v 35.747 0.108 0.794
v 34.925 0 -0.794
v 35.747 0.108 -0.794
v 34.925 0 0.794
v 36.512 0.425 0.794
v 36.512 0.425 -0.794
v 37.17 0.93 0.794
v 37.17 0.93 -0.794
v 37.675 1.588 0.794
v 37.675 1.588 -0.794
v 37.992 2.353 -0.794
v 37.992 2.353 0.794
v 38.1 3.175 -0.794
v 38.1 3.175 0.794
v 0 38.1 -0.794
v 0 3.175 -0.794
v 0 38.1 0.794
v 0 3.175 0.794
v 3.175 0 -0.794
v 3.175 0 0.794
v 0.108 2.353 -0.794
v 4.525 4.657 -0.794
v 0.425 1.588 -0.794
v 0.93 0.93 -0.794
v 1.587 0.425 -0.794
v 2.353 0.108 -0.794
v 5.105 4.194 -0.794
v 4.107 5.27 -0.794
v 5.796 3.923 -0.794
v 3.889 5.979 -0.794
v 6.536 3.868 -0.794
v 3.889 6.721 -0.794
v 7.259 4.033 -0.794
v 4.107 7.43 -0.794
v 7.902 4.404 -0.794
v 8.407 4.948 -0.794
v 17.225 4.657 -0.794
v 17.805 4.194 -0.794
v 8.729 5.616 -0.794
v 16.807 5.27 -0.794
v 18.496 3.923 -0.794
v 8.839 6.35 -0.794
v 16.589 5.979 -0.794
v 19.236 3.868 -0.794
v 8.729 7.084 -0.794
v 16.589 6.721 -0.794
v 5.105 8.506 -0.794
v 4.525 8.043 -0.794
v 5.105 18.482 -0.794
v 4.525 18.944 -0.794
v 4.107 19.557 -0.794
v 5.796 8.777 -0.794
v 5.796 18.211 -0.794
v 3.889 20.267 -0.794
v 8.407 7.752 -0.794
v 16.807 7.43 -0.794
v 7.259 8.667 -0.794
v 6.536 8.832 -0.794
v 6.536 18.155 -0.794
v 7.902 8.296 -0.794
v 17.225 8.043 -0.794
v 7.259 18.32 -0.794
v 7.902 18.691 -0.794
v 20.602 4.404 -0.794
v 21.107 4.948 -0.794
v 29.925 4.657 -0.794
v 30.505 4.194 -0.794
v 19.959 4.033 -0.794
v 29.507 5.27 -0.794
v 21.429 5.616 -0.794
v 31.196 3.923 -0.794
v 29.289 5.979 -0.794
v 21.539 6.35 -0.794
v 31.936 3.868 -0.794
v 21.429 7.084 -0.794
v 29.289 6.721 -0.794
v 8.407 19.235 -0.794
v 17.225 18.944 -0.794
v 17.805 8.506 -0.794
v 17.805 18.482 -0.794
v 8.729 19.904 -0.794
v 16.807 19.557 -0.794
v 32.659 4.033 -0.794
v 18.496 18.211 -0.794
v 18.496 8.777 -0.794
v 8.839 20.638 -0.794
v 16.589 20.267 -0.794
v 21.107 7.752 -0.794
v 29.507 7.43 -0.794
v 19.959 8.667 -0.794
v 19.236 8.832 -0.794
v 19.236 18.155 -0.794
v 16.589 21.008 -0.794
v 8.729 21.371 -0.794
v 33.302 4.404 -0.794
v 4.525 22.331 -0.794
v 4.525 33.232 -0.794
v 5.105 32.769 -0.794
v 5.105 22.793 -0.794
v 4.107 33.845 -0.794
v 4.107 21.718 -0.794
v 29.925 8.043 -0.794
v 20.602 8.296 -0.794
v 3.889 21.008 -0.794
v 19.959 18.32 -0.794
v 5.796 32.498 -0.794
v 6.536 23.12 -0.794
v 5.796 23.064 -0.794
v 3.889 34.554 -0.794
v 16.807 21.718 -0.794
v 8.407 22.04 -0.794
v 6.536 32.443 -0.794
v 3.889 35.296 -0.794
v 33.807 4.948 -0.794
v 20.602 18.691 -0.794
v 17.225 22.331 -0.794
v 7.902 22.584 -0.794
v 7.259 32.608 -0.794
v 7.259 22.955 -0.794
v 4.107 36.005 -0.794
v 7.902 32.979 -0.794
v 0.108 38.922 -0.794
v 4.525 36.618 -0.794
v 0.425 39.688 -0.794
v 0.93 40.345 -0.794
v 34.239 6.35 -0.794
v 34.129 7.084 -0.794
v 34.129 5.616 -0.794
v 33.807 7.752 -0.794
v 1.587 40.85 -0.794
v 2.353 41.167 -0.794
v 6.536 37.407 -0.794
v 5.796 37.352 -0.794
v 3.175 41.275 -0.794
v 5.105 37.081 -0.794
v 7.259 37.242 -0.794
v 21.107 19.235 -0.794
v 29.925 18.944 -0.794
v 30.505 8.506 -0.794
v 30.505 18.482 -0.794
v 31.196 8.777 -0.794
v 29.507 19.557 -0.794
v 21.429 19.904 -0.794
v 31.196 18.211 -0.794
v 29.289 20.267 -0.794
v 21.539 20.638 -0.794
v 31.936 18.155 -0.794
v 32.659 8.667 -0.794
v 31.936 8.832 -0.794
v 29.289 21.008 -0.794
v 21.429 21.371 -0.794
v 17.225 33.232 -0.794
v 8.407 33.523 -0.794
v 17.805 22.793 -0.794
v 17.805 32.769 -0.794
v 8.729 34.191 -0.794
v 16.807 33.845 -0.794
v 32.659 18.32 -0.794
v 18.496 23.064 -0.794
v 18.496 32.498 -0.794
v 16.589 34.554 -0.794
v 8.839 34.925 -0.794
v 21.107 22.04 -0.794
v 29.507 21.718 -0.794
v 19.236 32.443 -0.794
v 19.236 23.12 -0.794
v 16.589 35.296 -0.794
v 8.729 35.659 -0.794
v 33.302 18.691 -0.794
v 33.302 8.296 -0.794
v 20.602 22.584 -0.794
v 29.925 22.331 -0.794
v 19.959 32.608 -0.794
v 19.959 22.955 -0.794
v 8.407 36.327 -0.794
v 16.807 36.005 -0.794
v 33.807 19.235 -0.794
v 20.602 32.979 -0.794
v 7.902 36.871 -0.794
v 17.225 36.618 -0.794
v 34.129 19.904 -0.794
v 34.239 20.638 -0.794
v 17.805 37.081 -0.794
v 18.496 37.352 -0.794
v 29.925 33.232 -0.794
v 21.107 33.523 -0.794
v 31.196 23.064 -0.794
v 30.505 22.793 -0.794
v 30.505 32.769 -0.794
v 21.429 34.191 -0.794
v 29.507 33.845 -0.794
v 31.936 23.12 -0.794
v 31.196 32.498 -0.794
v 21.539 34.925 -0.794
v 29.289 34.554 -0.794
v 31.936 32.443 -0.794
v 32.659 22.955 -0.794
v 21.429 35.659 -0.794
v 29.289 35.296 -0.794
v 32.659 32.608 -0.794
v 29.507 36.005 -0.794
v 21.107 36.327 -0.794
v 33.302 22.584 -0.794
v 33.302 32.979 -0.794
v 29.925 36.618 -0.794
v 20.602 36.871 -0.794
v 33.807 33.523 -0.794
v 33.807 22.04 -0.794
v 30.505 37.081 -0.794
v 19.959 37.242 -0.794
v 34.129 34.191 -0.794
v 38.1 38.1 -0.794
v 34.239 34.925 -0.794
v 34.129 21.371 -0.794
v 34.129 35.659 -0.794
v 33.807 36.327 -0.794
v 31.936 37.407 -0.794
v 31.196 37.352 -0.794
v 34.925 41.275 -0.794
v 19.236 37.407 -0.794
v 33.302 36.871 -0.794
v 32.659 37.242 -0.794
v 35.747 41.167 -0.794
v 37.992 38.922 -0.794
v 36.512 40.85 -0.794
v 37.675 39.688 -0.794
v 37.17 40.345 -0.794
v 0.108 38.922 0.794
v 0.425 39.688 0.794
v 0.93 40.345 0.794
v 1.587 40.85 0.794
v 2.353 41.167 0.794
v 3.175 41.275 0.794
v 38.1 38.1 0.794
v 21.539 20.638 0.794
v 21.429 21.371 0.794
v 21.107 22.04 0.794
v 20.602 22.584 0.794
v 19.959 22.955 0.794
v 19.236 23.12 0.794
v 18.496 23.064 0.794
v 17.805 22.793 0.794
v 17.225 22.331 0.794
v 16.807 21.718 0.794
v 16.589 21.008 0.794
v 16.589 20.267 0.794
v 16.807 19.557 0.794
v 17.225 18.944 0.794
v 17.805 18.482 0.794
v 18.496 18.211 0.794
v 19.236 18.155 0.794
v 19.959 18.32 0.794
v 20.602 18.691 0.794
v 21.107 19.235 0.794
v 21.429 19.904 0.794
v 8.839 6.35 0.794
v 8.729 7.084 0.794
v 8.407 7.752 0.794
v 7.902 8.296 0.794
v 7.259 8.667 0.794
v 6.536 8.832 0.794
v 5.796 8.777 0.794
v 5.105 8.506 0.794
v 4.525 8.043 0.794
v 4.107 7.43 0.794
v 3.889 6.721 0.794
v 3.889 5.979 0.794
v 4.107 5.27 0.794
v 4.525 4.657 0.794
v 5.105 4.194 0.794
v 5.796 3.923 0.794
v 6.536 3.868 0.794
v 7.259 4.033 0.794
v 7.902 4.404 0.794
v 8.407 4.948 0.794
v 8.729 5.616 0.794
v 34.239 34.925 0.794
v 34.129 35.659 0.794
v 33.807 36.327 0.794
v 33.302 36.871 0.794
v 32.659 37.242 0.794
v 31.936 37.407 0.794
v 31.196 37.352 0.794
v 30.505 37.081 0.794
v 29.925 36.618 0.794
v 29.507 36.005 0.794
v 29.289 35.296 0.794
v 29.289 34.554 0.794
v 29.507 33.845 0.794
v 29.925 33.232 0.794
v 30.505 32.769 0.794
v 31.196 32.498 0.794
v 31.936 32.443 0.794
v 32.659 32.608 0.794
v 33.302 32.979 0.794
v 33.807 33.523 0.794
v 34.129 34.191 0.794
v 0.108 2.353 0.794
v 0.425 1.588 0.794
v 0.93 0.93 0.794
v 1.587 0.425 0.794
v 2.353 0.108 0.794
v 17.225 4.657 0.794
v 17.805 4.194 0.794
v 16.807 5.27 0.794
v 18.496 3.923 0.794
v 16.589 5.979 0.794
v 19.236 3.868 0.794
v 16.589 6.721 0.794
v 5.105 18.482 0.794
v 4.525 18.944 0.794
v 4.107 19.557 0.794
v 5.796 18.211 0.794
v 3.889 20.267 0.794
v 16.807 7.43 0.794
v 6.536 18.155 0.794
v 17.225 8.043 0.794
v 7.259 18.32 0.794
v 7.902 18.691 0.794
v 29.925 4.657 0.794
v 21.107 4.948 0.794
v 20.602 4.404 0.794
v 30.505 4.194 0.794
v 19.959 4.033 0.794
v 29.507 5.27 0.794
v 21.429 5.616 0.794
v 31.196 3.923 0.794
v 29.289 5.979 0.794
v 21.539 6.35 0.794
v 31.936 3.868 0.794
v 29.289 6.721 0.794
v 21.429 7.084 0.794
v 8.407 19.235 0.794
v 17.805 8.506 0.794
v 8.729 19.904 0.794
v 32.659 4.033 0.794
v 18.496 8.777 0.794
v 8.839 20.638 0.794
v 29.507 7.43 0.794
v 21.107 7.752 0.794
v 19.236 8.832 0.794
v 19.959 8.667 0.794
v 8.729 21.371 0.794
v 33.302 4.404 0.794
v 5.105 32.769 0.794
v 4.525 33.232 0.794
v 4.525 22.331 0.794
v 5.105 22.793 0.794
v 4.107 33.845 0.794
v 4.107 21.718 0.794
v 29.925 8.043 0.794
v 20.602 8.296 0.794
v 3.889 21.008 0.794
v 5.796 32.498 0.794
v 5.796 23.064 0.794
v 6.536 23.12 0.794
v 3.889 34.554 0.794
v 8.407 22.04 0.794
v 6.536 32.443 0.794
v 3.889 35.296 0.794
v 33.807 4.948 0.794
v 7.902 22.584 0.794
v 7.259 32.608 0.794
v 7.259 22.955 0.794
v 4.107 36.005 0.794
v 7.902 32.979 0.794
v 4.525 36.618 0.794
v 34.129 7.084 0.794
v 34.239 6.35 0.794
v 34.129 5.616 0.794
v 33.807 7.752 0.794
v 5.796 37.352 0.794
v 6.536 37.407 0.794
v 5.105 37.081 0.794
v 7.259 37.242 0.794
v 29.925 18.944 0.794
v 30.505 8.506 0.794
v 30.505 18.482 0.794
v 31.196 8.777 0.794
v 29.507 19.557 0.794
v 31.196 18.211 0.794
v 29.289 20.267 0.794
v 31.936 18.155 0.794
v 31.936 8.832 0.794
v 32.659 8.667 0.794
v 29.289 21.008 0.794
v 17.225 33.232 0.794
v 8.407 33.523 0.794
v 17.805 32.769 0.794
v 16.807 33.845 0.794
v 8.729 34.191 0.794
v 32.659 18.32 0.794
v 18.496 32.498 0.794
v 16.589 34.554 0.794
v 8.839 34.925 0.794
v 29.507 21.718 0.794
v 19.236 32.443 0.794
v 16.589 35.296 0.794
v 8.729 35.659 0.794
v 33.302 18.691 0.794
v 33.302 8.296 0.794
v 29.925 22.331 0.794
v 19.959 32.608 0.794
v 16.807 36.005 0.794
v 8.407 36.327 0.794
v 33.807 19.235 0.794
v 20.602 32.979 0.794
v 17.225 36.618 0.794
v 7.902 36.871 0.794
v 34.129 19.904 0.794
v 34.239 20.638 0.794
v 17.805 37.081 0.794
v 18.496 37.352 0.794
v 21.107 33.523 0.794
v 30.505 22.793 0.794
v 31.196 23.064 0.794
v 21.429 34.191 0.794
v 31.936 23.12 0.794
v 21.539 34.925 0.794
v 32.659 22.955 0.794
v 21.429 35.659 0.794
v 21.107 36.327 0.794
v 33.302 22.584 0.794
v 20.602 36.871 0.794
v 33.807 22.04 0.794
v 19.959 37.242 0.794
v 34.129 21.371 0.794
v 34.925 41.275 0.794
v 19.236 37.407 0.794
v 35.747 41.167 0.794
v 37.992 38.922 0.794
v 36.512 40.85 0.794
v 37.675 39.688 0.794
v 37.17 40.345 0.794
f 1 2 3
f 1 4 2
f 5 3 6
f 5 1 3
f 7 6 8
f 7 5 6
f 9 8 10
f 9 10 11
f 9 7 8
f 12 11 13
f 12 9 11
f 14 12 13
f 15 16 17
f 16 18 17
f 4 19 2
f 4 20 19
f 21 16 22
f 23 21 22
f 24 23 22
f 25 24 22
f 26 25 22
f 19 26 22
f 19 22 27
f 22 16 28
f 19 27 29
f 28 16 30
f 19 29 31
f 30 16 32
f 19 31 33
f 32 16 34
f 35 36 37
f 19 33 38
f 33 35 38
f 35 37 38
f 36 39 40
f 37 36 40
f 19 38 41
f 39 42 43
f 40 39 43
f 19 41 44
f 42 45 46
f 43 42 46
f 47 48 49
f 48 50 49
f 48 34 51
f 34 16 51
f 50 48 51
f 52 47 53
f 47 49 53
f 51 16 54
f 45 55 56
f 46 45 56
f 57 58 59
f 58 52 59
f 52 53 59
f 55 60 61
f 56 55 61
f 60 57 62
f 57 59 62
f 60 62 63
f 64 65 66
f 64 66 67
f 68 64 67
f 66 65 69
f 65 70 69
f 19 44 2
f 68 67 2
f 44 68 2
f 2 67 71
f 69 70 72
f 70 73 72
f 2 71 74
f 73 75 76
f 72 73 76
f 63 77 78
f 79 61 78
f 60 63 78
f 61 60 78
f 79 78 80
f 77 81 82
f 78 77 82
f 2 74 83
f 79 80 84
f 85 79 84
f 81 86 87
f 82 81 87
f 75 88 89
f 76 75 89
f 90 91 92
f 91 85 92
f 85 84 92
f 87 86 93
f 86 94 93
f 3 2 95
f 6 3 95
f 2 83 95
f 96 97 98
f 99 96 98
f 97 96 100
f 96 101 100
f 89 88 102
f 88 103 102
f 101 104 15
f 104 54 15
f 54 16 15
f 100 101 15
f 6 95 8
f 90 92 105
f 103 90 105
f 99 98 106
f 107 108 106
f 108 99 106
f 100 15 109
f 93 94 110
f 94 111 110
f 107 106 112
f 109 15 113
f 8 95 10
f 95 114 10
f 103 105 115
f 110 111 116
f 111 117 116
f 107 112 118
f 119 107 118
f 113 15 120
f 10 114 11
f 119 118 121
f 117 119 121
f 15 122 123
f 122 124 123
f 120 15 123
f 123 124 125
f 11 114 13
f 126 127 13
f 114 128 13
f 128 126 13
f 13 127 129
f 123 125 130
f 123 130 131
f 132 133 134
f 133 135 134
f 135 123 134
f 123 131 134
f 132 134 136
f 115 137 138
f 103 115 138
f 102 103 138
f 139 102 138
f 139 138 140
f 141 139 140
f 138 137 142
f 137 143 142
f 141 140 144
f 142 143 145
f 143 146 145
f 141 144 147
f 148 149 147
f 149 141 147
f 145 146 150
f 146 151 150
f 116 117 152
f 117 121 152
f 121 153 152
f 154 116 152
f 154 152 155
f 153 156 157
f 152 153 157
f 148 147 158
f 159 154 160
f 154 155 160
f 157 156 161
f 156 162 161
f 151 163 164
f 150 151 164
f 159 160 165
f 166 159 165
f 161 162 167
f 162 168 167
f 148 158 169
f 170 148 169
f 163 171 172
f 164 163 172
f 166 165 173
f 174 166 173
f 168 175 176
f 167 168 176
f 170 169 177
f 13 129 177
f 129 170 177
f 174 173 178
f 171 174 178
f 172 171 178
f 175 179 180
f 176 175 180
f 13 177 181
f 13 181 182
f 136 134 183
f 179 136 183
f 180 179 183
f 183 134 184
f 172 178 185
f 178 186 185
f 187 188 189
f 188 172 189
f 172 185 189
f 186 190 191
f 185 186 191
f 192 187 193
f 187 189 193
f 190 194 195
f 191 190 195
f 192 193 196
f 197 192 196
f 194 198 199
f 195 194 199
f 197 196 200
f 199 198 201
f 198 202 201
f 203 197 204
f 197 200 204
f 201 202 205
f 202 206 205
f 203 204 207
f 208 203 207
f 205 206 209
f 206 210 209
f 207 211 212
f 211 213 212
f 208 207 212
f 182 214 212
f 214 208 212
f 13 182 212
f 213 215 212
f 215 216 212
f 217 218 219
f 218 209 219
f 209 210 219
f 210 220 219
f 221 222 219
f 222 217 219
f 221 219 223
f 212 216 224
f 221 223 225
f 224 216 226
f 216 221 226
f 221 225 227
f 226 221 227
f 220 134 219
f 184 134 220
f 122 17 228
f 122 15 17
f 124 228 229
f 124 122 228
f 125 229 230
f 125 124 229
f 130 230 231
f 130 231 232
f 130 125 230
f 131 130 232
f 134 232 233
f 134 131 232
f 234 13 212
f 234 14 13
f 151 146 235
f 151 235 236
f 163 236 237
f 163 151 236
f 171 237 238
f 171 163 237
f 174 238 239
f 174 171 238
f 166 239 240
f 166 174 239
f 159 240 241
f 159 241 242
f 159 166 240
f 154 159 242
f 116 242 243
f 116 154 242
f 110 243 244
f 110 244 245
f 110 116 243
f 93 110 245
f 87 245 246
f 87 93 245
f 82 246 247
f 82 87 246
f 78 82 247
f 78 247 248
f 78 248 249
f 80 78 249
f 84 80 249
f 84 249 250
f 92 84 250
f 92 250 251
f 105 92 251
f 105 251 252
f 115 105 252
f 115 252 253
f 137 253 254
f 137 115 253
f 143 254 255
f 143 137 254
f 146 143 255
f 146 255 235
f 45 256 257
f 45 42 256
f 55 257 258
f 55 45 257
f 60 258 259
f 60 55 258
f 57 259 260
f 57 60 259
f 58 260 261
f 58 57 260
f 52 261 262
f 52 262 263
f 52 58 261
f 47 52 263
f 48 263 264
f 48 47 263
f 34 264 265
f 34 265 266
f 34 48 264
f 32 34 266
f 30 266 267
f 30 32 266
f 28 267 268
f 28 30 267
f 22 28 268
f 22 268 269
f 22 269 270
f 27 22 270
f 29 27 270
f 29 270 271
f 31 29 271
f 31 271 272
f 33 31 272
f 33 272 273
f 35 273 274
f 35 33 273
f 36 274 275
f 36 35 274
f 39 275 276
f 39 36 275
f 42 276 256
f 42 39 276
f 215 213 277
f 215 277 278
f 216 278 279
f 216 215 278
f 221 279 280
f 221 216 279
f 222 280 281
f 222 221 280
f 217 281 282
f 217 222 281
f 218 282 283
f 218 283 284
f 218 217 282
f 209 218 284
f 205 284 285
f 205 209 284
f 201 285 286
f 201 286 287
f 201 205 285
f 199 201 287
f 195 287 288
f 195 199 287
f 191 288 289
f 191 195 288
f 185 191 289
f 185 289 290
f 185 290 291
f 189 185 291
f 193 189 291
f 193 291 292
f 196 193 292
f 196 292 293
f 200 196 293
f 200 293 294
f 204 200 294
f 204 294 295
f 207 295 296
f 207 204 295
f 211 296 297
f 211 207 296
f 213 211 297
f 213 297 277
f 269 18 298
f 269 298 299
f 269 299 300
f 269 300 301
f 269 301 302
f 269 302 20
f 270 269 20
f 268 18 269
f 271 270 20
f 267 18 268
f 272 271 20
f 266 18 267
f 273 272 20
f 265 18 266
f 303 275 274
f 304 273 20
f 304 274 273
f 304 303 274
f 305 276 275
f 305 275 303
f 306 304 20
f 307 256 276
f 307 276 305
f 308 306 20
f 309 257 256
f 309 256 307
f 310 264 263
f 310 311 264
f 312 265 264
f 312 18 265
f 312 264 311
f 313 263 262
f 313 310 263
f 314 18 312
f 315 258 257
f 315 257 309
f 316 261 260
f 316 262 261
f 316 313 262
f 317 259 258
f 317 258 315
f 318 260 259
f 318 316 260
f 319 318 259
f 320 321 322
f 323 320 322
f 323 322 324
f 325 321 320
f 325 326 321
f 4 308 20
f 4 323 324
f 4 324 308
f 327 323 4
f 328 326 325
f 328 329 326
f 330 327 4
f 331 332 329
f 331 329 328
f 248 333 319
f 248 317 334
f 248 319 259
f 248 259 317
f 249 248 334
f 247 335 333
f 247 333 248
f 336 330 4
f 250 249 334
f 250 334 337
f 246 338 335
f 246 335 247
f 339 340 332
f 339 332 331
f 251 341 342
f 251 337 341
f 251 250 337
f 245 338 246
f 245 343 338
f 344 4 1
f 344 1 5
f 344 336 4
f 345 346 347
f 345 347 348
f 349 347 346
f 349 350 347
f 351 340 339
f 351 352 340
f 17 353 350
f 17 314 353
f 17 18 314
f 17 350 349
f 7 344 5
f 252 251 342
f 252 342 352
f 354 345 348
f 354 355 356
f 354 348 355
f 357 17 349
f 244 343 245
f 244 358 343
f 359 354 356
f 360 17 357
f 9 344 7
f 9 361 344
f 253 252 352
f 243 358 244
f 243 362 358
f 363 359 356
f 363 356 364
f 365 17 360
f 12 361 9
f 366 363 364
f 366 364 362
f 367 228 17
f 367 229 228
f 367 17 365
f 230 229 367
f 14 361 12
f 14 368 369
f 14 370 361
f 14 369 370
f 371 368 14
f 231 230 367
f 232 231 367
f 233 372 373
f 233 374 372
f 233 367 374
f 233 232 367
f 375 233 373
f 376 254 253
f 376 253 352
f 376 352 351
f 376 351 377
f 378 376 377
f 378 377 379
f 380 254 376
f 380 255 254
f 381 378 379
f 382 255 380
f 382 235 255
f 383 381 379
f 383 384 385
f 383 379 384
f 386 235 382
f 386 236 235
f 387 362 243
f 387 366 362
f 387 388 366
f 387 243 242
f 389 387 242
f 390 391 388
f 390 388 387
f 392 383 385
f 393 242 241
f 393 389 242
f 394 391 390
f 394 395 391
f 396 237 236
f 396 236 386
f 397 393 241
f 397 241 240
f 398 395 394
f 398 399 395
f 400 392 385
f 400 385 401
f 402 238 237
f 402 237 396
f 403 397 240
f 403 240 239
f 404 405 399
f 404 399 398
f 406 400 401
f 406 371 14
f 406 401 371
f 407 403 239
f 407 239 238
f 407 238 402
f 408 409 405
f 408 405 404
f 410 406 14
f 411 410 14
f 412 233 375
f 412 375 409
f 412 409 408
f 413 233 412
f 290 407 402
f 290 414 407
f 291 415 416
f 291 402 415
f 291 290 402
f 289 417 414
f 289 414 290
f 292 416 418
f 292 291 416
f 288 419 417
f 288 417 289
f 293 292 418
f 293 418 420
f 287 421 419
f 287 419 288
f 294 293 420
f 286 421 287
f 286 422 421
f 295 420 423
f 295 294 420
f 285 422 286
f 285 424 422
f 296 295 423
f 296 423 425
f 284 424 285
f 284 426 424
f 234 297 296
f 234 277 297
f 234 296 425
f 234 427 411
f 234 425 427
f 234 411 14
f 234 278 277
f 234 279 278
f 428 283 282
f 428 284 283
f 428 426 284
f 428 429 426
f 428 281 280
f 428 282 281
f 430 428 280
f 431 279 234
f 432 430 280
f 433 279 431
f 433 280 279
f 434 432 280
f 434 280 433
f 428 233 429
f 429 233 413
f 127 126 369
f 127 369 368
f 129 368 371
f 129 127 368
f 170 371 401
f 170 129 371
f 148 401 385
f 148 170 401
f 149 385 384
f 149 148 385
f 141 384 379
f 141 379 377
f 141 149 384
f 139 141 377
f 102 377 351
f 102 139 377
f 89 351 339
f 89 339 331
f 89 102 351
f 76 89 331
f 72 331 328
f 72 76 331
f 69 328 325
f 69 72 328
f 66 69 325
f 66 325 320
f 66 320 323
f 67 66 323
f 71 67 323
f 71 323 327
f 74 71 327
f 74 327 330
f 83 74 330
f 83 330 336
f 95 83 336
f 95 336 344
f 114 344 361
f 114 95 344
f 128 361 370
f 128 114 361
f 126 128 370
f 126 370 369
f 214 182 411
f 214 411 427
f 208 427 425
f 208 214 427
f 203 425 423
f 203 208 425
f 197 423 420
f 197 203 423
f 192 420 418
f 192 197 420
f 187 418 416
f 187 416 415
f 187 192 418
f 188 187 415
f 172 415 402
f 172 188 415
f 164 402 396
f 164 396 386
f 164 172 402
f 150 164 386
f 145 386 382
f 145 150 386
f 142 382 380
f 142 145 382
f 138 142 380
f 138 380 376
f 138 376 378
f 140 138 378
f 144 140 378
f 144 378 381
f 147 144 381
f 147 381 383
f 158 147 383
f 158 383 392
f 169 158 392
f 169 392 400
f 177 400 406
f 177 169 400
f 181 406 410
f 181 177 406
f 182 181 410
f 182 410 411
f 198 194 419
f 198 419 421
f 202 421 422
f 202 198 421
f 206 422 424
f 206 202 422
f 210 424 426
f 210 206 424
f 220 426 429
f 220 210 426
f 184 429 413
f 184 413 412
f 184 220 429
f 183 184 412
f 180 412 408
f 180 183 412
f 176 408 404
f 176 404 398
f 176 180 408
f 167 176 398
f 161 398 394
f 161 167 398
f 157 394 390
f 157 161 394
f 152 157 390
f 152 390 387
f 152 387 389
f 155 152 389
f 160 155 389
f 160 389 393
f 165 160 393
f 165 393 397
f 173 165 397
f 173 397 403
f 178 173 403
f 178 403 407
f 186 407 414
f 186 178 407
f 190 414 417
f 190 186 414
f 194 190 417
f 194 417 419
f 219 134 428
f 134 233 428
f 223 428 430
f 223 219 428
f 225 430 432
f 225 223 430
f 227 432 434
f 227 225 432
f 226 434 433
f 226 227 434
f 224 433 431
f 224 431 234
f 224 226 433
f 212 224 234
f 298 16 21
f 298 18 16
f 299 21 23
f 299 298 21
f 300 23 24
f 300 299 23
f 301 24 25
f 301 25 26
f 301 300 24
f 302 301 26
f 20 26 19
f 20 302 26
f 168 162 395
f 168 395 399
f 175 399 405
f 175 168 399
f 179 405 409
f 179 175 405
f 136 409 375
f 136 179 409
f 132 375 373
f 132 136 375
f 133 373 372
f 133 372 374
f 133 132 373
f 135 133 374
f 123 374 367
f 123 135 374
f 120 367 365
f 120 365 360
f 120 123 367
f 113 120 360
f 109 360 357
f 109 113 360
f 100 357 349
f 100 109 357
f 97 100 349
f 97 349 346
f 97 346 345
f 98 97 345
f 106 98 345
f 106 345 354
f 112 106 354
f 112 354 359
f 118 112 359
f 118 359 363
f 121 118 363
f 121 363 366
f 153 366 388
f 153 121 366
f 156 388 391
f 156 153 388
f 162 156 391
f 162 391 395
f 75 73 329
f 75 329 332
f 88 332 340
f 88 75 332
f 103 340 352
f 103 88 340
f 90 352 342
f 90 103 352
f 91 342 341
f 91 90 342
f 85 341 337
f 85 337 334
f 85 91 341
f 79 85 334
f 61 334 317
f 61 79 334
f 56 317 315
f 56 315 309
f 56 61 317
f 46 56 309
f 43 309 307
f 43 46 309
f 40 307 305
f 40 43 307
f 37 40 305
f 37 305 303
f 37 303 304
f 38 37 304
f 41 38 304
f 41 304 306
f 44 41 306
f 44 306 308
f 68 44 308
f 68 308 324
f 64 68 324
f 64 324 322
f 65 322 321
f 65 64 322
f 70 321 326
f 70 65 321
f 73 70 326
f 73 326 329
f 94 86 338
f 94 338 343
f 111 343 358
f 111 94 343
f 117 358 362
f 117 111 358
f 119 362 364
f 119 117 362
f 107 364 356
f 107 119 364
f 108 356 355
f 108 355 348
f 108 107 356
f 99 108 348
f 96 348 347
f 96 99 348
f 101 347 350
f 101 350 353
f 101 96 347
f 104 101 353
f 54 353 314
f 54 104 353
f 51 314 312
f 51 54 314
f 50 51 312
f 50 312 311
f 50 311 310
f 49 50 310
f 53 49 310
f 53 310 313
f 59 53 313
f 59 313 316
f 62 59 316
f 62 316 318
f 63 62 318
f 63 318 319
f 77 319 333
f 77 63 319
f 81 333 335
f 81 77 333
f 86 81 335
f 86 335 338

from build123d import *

# Parameters (mm, degrees)
SKETCH1_W           = 38.1
SKETCH1_H           = 41.275
SKETCH1_R           = 2.4892
BOSS_EXTRUDE1_DEPTH = 0.79375
LPATTERN1_START     = -0.79375
LPATTERN1_OUTLINE_R = 2.4892
LPATTERN1_DEPTH     = 1.5875
FILLET1_R           = 3.175


# Read off the part's stored shape, not the designer's step: LPattern1
with BuildPart() as part:
    # Sketch1 → Boss-Extrude1 (new, symmetric)
    with BuildSketch(Plane.XY):
        with Locations((19.05, 20.6375)):
            Rectangle(SKETCH1_W, SKETCH1_H)
        with Locations((6.35, 6.35)):
            Circle(SKETCH1_R, mode=Mode.SUBTRACT)
    extrude(amount=BOSS_EXTRUDE1_DEPTH, both=True)

    # LPattern1 outline → LPattern1 (cut)
    with BuildSketch(Plane.XY.offset(LPATTERN1_START)):
        with Locations((31.75, 34.925)):
            Circle(LPATTERN1_OUTLINE_R)
        with Locations((31.75, 20.6375)):
            Circle(LPATTERN1_OUTLINE_R)
        with Locations((31.75, 6.35)):
            Circle(LPATTERN1_OUTLINE_R)
        with Locations((19.05, 34.925)):
            Circle(LPATTERN1_OUTLINE_R)
        with Locations((19.05, 20.6375)):
            Circle(LPATTERN1_OUTLINE_R)
        with Locations((19.05, 6.35)):
            Circle(LPATTERN1_OUTLINE_R)
        with Locations((6.35, 34.925)):
            Circle(LPATTERN1_OUTLINE_R)
        with Locations((6.35, 20.6375)):
            Circle(LPATTERN1_OUTLINE_R)
    extrude(amount=LPATTERN1_DEPTH, mode=Mode.SUBTRACT)

    # Fillet1
    fillet1_edges = [part.edges().sort_by_distance(p)[0] for p in [
        (0, 41.275, 0),
        (38.1, 41.275, 0),
        (38.1, 0, 0),
        (0, 0, 0),
    ]]
    fillet(fillet1_edges, radius=FILLET1_R)


solid = part.part
